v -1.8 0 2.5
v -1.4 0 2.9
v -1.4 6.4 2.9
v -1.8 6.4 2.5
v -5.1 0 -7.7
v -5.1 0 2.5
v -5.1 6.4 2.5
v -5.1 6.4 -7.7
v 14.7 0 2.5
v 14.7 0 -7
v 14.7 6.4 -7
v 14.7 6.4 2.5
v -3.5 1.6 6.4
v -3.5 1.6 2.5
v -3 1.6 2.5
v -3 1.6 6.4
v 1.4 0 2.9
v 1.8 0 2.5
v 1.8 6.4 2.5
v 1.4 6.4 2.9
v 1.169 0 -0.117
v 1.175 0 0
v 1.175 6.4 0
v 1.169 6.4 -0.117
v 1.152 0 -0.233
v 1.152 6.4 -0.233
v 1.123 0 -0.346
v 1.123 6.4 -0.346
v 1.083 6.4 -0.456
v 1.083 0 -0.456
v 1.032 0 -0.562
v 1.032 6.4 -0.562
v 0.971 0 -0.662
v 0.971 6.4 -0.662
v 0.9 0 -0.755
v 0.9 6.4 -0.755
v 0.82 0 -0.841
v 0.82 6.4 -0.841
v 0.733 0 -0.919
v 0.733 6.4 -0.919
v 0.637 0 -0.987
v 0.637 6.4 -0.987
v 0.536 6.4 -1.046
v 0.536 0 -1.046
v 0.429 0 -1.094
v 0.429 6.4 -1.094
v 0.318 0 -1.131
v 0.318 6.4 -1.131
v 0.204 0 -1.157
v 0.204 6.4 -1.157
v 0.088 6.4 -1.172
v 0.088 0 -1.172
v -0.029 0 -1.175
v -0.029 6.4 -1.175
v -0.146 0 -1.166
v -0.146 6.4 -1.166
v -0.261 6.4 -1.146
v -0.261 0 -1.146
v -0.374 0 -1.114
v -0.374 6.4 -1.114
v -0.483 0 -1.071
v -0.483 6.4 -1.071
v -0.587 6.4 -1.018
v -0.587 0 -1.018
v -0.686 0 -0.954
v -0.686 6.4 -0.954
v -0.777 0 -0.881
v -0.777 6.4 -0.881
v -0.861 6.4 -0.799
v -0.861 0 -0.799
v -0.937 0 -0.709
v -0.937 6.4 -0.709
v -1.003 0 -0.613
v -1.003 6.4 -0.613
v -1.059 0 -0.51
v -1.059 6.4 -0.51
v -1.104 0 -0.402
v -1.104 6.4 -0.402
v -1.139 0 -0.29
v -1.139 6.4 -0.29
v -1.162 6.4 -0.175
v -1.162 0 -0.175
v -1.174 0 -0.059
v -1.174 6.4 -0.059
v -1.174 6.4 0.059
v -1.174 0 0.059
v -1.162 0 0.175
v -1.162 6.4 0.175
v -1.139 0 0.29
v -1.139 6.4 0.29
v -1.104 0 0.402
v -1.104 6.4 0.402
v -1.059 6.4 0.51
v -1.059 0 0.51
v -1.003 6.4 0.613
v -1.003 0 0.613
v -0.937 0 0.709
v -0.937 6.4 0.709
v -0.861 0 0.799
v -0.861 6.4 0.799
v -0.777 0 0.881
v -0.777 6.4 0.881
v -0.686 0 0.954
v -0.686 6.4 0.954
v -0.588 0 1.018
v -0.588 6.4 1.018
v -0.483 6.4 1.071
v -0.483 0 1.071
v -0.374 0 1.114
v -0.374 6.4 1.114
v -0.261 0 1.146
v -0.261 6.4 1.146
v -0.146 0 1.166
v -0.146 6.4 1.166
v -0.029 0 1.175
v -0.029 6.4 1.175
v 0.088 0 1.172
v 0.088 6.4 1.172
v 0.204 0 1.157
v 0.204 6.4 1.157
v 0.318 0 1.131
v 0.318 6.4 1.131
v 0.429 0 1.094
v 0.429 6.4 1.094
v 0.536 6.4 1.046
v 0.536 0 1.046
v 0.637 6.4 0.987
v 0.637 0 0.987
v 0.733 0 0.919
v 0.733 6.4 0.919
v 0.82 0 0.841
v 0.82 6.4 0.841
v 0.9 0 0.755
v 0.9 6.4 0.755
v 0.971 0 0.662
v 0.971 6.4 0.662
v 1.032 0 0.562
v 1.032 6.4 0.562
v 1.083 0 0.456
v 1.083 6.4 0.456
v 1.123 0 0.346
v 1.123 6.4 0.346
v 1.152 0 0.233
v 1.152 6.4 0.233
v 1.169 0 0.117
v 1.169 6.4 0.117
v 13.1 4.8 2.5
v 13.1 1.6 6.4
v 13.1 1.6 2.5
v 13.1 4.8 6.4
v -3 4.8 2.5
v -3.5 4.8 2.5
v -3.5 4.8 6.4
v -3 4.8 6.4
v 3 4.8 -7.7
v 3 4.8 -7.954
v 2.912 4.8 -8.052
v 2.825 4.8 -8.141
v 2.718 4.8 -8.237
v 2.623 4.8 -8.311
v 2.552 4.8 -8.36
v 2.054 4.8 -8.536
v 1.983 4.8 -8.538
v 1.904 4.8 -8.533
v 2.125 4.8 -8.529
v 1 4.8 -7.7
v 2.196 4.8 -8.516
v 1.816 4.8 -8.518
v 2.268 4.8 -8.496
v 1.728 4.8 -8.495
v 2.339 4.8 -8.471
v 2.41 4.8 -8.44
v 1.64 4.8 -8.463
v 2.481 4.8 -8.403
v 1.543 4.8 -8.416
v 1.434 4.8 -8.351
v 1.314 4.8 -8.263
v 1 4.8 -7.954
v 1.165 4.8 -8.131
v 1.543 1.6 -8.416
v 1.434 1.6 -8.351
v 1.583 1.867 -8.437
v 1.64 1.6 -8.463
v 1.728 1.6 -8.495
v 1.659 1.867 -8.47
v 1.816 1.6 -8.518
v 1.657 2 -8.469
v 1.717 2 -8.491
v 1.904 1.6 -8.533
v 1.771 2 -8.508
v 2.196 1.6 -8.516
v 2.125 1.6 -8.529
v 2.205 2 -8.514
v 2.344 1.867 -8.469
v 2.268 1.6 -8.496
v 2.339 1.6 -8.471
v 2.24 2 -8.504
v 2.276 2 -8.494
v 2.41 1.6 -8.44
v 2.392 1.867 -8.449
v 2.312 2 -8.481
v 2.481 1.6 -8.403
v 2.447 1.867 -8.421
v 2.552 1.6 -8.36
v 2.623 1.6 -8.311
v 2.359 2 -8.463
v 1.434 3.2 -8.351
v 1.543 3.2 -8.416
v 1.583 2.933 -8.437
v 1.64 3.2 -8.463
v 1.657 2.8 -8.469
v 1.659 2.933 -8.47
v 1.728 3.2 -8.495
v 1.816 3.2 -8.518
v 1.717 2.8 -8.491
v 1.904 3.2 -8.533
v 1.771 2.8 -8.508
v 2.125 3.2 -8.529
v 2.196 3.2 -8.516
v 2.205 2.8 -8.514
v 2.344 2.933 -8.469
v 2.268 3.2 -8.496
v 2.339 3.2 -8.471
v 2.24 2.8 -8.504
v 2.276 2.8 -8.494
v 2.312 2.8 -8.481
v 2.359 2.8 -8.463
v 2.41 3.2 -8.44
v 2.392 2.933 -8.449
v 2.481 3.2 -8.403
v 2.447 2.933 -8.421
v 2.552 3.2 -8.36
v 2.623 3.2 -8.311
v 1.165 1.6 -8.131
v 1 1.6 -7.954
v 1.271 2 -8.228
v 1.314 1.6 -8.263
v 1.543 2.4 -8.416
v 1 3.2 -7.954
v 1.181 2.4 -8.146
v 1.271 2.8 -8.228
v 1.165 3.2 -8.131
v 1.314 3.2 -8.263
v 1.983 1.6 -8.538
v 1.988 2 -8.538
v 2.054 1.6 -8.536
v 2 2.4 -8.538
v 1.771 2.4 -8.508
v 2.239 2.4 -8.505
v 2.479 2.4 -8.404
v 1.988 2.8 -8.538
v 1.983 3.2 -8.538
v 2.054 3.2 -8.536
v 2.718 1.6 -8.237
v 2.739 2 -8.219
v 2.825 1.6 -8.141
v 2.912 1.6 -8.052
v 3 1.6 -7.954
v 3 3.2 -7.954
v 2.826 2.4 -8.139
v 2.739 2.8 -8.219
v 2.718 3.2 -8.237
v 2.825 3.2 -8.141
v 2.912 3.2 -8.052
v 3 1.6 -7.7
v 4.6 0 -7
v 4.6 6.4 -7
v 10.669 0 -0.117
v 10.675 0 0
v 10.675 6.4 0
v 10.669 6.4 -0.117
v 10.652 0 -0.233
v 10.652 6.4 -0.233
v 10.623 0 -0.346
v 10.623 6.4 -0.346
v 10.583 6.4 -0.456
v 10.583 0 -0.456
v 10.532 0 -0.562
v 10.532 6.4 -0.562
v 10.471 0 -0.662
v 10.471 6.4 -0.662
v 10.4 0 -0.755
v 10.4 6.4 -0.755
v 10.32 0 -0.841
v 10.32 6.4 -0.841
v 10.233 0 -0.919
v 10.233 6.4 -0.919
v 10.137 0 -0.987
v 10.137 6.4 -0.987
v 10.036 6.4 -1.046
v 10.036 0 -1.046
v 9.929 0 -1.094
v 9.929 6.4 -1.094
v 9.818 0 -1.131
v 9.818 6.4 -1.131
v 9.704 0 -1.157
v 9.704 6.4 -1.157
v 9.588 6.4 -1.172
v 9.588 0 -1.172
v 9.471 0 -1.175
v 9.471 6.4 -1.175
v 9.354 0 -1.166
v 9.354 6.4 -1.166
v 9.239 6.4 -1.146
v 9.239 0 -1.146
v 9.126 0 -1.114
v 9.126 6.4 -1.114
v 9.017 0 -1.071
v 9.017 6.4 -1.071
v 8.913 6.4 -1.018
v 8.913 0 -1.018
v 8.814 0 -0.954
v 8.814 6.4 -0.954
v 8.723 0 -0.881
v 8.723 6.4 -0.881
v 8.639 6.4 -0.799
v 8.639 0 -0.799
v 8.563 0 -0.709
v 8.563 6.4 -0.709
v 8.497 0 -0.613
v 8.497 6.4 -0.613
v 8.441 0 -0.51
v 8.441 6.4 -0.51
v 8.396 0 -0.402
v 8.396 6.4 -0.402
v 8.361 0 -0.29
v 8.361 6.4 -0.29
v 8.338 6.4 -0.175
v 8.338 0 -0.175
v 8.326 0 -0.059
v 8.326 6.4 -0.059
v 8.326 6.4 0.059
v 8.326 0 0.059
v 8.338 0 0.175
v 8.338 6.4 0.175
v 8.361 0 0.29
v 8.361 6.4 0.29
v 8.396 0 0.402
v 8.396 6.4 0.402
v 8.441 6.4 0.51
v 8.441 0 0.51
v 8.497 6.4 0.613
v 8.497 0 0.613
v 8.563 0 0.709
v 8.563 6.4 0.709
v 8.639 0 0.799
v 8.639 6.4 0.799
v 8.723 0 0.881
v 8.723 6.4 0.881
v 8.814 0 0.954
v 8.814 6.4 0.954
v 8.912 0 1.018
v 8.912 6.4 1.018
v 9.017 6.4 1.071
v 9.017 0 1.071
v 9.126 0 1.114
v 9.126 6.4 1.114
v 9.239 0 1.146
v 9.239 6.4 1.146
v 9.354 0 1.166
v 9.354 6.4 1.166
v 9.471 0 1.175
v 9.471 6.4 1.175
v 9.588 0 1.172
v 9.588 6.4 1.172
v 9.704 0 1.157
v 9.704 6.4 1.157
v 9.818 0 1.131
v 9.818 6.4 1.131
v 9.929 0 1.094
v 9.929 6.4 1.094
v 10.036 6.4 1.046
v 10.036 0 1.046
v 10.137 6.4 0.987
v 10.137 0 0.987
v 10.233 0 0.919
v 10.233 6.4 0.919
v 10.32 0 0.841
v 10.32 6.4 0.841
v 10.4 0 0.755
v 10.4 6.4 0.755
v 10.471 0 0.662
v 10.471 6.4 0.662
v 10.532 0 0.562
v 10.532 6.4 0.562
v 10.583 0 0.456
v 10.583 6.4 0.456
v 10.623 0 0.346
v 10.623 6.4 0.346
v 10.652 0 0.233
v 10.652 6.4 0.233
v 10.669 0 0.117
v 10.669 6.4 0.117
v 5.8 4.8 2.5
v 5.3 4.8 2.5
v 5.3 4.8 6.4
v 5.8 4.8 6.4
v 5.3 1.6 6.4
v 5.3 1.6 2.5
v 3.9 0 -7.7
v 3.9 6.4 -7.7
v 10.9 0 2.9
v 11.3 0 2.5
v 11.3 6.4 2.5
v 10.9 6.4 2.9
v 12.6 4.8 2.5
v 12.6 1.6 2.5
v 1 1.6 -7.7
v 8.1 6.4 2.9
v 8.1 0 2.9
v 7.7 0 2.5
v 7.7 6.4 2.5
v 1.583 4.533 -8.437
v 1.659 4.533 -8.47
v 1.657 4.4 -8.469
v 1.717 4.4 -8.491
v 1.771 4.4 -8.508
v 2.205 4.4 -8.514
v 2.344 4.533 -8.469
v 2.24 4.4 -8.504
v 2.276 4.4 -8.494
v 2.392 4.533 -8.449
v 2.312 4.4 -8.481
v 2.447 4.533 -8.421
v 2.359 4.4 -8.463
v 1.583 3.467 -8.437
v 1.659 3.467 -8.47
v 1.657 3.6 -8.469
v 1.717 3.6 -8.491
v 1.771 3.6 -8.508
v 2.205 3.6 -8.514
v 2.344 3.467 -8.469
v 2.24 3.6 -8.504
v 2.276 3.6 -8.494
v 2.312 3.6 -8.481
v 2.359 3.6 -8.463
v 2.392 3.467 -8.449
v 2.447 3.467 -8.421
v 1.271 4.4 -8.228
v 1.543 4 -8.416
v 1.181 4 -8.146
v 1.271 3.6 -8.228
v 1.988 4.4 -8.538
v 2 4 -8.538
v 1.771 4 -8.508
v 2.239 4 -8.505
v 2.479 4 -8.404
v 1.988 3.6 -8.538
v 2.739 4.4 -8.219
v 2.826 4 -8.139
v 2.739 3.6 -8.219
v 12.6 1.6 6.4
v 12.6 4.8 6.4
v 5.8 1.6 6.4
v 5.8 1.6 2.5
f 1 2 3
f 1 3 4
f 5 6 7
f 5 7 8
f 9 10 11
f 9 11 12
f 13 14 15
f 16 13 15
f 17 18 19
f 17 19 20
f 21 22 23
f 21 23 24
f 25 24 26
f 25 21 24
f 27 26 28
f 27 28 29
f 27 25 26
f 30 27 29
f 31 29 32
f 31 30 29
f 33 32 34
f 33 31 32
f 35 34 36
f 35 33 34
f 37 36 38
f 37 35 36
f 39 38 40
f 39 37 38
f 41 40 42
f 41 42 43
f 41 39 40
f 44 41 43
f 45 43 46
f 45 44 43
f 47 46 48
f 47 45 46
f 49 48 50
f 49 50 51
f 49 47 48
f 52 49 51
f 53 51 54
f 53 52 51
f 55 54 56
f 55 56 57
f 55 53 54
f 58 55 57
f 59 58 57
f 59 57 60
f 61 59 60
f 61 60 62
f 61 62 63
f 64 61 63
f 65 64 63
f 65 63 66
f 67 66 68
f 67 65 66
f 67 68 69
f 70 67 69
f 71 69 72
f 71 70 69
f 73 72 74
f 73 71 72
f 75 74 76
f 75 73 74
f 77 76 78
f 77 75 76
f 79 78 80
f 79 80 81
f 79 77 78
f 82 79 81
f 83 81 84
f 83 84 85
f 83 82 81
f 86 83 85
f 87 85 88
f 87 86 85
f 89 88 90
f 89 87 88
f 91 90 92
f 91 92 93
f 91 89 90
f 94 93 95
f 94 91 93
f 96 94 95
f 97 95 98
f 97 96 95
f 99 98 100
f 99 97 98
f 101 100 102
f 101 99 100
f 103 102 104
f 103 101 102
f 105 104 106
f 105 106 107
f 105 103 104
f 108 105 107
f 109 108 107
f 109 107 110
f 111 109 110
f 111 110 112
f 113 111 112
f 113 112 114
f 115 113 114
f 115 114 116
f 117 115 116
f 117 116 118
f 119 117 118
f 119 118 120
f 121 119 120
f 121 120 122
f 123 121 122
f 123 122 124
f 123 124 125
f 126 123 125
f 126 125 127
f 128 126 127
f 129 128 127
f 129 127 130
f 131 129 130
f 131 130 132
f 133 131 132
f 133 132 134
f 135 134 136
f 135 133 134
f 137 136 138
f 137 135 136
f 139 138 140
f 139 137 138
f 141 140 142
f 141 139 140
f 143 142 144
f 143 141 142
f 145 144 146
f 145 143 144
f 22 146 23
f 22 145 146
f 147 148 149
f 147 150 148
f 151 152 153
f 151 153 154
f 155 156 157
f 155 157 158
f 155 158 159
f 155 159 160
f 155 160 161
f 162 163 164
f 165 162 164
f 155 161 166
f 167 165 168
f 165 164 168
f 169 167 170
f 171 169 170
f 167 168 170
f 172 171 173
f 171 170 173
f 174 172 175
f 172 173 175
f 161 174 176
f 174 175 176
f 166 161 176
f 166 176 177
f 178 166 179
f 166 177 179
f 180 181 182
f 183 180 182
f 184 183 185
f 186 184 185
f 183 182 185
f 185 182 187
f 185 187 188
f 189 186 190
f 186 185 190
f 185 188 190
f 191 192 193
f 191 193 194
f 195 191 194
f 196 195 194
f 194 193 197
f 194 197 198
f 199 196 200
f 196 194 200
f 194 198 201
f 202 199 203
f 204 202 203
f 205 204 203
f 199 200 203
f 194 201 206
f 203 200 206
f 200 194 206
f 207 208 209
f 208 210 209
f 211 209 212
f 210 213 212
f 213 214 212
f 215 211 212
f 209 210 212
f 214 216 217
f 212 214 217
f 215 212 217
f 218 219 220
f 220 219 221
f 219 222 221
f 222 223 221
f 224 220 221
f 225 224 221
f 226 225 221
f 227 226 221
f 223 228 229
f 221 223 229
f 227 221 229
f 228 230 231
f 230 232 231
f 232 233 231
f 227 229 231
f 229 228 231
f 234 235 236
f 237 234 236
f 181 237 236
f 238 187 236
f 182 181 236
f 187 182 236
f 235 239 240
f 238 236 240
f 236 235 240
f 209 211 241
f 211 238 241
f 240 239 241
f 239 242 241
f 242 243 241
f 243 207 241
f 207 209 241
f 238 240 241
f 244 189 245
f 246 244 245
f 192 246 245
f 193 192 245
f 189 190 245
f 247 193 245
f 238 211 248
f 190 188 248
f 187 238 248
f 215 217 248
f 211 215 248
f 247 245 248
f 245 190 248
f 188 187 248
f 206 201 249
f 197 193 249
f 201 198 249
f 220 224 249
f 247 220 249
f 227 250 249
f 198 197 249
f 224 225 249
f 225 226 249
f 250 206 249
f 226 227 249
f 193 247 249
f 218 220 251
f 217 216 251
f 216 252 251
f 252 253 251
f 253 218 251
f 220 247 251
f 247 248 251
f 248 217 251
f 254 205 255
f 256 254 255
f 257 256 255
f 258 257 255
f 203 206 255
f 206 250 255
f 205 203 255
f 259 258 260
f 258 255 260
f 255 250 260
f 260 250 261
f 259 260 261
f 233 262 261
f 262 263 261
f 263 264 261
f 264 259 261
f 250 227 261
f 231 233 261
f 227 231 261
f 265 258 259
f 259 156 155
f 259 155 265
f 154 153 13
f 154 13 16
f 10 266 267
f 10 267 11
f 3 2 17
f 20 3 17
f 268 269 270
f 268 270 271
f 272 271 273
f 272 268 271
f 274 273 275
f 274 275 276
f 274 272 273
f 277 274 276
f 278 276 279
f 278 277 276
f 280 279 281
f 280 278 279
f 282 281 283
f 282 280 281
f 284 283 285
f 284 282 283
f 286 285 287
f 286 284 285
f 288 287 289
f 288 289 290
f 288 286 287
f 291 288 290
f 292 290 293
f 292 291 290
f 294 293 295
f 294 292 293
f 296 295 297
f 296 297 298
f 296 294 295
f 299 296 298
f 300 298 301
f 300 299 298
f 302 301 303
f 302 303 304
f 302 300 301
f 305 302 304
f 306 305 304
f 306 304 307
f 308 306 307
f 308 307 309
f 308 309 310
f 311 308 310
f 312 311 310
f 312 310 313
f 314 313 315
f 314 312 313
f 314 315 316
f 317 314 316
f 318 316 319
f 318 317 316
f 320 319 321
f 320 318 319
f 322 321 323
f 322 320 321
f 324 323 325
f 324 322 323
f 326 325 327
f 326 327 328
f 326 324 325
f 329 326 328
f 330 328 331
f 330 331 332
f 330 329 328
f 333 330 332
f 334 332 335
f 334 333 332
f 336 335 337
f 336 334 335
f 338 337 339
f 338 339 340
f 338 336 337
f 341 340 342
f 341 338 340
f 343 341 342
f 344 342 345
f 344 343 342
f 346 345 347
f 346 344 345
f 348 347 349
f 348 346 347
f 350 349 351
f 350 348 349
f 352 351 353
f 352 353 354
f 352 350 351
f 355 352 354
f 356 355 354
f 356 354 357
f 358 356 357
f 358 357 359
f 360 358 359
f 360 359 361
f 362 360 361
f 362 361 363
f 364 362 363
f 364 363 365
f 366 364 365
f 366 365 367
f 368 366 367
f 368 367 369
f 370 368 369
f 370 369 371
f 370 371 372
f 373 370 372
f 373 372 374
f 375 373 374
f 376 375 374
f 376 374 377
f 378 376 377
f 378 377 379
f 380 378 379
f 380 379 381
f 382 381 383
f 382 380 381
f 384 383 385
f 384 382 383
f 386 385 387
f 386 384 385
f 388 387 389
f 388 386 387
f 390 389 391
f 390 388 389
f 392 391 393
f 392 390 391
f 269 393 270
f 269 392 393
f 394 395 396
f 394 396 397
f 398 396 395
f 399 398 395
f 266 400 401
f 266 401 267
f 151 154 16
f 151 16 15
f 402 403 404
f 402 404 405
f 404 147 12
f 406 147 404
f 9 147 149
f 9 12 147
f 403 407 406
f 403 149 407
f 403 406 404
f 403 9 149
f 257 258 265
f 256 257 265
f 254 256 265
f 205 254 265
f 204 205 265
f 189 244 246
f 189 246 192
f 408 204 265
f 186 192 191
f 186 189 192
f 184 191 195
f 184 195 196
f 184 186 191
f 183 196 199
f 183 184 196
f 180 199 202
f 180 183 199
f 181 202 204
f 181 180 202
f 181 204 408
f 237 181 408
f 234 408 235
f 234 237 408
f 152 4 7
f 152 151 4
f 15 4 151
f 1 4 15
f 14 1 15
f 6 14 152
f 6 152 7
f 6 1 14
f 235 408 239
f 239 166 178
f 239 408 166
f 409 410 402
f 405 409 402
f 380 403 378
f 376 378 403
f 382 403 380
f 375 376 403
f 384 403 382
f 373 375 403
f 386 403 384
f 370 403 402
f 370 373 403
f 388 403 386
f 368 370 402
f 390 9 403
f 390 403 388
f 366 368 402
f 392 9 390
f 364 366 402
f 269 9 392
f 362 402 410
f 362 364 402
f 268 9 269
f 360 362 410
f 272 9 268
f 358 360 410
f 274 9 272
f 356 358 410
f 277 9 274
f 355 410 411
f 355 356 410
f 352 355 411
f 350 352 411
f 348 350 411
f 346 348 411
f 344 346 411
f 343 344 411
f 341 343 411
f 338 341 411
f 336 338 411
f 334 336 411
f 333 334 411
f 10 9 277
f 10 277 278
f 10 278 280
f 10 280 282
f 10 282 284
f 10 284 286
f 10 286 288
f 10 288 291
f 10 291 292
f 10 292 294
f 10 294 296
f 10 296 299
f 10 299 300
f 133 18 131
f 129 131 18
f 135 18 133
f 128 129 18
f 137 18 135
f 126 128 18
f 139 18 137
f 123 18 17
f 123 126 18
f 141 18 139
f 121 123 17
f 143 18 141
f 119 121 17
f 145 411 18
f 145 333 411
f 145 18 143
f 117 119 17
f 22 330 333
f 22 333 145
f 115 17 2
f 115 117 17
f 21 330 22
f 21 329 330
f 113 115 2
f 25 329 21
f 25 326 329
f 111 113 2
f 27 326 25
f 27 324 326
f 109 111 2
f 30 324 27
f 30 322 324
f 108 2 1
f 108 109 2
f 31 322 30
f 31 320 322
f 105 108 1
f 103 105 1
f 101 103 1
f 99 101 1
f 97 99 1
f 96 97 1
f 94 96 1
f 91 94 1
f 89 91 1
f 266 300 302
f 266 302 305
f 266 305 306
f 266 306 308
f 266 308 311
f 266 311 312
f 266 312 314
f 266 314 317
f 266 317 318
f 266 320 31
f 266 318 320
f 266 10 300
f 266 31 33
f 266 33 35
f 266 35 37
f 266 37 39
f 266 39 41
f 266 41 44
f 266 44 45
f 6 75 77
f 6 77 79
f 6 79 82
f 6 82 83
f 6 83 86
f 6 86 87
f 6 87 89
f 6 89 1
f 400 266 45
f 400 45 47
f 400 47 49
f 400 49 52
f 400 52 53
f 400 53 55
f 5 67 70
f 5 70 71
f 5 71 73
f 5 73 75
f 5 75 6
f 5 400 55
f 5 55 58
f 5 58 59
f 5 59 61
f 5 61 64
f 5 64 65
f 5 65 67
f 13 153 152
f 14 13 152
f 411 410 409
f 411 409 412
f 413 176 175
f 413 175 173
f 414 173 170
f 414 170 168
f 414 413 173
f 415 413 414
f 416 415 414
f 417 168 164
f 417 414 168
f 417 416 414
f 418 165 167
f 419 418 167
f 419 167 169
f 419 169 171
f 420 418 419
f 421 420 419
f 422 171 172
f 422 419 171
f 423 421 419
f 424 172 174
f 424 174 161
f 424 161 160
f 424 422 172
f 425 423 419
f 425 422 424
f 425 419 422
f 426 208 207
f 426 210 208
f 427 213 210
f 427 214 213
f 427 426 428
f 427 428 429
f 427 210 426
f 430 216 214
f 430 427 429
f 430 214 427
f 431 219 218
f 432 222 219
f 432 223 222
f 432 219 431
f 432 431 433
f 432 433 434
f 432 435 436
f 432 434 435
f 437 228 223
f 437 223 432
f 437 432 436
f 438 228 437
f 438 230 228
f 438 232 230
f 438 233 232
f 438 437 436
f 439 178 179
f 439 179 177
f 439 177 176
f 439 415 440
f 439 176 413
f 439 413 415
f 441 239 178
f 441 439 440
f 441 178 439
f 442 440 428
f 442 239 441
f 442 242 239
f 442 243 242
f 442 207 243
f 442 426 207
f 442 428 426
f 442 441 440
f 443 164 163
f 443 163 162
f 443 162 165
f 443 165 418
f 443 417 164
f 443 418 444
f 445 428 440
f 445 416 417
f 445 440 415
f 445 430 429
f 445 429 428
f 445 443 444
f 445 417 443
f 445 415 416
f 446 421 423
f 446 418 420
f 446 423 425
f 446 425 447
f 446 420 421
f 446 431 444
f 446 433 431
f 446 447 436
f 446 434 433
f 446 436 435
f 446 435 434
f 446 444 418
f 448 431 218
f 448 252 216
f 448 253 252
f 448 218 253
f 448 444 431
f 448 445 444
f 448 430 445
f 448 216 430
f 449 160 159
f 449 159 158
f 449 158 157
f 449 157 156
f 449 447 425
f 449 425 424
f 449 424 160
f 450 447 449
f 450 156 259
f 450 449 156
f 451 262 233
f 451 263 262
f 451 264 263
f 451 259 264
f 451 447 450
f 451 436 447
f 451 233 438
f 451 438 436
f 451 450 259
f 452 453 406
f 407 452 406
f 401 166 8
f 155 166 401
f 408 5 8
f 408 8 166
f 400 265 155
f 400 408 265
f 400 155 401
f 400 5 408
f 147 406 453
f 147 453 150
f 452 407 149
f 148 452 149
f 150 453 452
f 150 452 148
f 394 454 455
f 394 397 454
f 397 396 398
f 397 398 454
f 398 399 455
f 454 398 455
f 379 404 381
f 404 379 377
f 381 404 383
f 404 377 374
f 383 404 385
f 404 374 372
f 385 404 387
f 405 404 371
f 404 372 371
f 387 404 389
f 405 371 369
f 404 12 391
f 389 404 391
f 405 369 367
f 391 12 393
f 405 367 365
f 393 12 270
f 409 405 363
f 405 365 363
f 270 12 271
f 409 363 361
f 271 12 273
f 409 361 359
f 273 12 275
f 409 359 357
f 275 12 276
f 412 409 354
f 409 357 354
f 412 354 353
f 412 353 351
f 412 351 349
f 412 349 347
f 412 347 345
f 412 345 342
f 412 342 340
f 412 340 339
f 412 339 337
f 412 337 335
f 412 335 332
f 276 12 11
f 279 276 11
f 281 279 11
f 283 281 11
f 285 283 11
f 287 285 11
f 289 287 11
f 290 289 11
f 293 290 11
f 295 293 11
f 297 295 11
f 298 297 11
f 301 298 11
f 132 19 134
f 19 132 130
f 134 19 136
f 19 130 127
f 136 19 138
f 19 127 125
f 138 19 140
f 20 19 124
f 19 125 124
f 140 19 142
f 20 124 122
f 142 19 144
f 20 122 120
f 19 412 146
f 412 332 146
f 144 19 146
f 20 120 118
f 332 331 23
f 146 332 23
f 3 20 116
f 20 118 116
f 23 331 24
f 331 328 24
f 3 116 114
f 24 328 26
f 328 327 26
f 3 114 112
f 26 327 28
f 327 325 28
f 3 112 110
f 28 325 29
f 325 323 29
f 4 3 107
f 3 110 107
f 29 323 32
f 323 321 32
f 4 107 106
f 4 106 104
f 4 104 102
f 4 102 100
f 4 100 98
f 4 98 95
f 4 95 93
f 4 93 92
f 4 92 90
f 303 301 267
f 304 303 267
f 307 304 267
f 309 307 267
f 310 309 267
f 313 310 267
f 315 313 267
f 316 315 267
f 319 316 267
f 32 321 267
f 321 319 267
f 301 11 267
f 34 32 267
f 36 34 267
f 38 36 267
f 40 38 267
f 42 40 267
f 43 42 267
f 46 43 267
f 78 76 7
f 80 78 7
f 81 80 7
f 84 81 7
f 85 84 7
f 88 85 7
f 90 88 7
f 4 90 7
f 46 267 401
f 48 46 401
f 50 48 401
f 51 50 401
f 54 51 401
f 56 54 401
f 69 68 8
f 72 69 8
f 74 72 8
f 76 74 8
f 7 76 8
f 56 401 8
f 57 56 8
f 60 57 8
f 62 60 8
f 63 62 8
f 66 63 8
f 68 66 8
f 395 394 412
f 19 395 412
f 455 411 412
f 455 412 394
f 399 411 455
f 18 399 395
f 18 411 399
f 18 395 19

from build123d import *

# Parameters (mm, degrees)
SKETCH2_R                = 1.175
BOSS_EXTRUDE1_DEPTH      = 6.4
BOSS_EXTRUDE2_DEPTH      = 1.6
BOSS_EXTRUDE2_DEPTH_BACK = 1.6
SKETCH4_W                = 0.5
SKETCH4_H                = 3.9
BOSS_EXTRUDE3_DEPTH      = 1.6
BOSS_EXTRUDE3_DEPTH_BACK = 1.6


with BuildPart() as part:
    # Sketch2 → Boss-Extrude1 (new body)
    with BuildSketch(Plane(origin=(0, 0, 0), x_dir=(1, 0, 0), z_dir=(0, 1, 0))):
        Polygon((0, -2.9), (-1.4, -2.9), (-1.8, -2.5), (-5.1, -2.5), (-5.1, 7.7), (3.9, 7.7), (4.6, 7), (14.7, 7), (14.7, -2.5), (11.3, -2.5), (10.9, -2.9), (9.5, -2.9), (8.1, -2.9), (7.7, -2.5), (1.8, -2.5), (1.4, -2.9), align=None)
        Circle(SKETCH2_R, mode=Mode.SUBTRACT)
        with Locations((9.5, 0)):
            Circle(SKETCH2_R, mode=Mode.SUBTRACT)
    extrude(amount=BOSS_EXTRUDE1_DEPTH)

    # Sketch3 → Boss-Extrude2 (add, two sides)
    with BuildSketch(Plane(origin=(0, 3.2, 0), x_dir=(1, 0, 0), z_dir=(0, 1, 0))) as boss_extrude2_sk:
        with BuildLine():
            Line((3, 7.7), (1, 7.7))
            Line((1, 7.7), (1, 7.954))
            add(Edge.make_bspline(
                [(1, 7.954), (2, 9.1224), (3, 7.954)],
                knots=[0, 0, 0, 1, 1, 1], degree=2))
            Line((3, 7.954), (3, 7.7))
        make_face()
    extrude(amount=BOSS_EXTRUDE2_DEPTH)
    extrude(boss_extrude2_sk.sketch, amount=-BOSS_EXTRUDE2_DEPTH_BACK)

    # Sketch4 → Boss-Extrude3 (add, two sides)
    with BuildSketch(Plane(origin=(0, 3.2, 0), x_dir=(1, 0, 0), z_dir=(0, 1, 0))) as boss_extrude3_sk:
        with Locations((-3.25, -4.45)):
            Rectangle(SKETCH4_W, SKETCH4_H)
        with Locations((5.55, -4.45)):
            Rectangle(SKETCH4_W, SKETCH4_H)
        with Locations((12.85, -4.45)):
            Rectangle(SKETCH4_W, SKETCH4_H)
    extrude(amount=BOSS_EXTRUDE3_DEPTH)
    extrude(boss_extrude3_sk.sketch, amount=-BOSS_EXTRUDE3_DEPTH_BACK)


solid = part.part
